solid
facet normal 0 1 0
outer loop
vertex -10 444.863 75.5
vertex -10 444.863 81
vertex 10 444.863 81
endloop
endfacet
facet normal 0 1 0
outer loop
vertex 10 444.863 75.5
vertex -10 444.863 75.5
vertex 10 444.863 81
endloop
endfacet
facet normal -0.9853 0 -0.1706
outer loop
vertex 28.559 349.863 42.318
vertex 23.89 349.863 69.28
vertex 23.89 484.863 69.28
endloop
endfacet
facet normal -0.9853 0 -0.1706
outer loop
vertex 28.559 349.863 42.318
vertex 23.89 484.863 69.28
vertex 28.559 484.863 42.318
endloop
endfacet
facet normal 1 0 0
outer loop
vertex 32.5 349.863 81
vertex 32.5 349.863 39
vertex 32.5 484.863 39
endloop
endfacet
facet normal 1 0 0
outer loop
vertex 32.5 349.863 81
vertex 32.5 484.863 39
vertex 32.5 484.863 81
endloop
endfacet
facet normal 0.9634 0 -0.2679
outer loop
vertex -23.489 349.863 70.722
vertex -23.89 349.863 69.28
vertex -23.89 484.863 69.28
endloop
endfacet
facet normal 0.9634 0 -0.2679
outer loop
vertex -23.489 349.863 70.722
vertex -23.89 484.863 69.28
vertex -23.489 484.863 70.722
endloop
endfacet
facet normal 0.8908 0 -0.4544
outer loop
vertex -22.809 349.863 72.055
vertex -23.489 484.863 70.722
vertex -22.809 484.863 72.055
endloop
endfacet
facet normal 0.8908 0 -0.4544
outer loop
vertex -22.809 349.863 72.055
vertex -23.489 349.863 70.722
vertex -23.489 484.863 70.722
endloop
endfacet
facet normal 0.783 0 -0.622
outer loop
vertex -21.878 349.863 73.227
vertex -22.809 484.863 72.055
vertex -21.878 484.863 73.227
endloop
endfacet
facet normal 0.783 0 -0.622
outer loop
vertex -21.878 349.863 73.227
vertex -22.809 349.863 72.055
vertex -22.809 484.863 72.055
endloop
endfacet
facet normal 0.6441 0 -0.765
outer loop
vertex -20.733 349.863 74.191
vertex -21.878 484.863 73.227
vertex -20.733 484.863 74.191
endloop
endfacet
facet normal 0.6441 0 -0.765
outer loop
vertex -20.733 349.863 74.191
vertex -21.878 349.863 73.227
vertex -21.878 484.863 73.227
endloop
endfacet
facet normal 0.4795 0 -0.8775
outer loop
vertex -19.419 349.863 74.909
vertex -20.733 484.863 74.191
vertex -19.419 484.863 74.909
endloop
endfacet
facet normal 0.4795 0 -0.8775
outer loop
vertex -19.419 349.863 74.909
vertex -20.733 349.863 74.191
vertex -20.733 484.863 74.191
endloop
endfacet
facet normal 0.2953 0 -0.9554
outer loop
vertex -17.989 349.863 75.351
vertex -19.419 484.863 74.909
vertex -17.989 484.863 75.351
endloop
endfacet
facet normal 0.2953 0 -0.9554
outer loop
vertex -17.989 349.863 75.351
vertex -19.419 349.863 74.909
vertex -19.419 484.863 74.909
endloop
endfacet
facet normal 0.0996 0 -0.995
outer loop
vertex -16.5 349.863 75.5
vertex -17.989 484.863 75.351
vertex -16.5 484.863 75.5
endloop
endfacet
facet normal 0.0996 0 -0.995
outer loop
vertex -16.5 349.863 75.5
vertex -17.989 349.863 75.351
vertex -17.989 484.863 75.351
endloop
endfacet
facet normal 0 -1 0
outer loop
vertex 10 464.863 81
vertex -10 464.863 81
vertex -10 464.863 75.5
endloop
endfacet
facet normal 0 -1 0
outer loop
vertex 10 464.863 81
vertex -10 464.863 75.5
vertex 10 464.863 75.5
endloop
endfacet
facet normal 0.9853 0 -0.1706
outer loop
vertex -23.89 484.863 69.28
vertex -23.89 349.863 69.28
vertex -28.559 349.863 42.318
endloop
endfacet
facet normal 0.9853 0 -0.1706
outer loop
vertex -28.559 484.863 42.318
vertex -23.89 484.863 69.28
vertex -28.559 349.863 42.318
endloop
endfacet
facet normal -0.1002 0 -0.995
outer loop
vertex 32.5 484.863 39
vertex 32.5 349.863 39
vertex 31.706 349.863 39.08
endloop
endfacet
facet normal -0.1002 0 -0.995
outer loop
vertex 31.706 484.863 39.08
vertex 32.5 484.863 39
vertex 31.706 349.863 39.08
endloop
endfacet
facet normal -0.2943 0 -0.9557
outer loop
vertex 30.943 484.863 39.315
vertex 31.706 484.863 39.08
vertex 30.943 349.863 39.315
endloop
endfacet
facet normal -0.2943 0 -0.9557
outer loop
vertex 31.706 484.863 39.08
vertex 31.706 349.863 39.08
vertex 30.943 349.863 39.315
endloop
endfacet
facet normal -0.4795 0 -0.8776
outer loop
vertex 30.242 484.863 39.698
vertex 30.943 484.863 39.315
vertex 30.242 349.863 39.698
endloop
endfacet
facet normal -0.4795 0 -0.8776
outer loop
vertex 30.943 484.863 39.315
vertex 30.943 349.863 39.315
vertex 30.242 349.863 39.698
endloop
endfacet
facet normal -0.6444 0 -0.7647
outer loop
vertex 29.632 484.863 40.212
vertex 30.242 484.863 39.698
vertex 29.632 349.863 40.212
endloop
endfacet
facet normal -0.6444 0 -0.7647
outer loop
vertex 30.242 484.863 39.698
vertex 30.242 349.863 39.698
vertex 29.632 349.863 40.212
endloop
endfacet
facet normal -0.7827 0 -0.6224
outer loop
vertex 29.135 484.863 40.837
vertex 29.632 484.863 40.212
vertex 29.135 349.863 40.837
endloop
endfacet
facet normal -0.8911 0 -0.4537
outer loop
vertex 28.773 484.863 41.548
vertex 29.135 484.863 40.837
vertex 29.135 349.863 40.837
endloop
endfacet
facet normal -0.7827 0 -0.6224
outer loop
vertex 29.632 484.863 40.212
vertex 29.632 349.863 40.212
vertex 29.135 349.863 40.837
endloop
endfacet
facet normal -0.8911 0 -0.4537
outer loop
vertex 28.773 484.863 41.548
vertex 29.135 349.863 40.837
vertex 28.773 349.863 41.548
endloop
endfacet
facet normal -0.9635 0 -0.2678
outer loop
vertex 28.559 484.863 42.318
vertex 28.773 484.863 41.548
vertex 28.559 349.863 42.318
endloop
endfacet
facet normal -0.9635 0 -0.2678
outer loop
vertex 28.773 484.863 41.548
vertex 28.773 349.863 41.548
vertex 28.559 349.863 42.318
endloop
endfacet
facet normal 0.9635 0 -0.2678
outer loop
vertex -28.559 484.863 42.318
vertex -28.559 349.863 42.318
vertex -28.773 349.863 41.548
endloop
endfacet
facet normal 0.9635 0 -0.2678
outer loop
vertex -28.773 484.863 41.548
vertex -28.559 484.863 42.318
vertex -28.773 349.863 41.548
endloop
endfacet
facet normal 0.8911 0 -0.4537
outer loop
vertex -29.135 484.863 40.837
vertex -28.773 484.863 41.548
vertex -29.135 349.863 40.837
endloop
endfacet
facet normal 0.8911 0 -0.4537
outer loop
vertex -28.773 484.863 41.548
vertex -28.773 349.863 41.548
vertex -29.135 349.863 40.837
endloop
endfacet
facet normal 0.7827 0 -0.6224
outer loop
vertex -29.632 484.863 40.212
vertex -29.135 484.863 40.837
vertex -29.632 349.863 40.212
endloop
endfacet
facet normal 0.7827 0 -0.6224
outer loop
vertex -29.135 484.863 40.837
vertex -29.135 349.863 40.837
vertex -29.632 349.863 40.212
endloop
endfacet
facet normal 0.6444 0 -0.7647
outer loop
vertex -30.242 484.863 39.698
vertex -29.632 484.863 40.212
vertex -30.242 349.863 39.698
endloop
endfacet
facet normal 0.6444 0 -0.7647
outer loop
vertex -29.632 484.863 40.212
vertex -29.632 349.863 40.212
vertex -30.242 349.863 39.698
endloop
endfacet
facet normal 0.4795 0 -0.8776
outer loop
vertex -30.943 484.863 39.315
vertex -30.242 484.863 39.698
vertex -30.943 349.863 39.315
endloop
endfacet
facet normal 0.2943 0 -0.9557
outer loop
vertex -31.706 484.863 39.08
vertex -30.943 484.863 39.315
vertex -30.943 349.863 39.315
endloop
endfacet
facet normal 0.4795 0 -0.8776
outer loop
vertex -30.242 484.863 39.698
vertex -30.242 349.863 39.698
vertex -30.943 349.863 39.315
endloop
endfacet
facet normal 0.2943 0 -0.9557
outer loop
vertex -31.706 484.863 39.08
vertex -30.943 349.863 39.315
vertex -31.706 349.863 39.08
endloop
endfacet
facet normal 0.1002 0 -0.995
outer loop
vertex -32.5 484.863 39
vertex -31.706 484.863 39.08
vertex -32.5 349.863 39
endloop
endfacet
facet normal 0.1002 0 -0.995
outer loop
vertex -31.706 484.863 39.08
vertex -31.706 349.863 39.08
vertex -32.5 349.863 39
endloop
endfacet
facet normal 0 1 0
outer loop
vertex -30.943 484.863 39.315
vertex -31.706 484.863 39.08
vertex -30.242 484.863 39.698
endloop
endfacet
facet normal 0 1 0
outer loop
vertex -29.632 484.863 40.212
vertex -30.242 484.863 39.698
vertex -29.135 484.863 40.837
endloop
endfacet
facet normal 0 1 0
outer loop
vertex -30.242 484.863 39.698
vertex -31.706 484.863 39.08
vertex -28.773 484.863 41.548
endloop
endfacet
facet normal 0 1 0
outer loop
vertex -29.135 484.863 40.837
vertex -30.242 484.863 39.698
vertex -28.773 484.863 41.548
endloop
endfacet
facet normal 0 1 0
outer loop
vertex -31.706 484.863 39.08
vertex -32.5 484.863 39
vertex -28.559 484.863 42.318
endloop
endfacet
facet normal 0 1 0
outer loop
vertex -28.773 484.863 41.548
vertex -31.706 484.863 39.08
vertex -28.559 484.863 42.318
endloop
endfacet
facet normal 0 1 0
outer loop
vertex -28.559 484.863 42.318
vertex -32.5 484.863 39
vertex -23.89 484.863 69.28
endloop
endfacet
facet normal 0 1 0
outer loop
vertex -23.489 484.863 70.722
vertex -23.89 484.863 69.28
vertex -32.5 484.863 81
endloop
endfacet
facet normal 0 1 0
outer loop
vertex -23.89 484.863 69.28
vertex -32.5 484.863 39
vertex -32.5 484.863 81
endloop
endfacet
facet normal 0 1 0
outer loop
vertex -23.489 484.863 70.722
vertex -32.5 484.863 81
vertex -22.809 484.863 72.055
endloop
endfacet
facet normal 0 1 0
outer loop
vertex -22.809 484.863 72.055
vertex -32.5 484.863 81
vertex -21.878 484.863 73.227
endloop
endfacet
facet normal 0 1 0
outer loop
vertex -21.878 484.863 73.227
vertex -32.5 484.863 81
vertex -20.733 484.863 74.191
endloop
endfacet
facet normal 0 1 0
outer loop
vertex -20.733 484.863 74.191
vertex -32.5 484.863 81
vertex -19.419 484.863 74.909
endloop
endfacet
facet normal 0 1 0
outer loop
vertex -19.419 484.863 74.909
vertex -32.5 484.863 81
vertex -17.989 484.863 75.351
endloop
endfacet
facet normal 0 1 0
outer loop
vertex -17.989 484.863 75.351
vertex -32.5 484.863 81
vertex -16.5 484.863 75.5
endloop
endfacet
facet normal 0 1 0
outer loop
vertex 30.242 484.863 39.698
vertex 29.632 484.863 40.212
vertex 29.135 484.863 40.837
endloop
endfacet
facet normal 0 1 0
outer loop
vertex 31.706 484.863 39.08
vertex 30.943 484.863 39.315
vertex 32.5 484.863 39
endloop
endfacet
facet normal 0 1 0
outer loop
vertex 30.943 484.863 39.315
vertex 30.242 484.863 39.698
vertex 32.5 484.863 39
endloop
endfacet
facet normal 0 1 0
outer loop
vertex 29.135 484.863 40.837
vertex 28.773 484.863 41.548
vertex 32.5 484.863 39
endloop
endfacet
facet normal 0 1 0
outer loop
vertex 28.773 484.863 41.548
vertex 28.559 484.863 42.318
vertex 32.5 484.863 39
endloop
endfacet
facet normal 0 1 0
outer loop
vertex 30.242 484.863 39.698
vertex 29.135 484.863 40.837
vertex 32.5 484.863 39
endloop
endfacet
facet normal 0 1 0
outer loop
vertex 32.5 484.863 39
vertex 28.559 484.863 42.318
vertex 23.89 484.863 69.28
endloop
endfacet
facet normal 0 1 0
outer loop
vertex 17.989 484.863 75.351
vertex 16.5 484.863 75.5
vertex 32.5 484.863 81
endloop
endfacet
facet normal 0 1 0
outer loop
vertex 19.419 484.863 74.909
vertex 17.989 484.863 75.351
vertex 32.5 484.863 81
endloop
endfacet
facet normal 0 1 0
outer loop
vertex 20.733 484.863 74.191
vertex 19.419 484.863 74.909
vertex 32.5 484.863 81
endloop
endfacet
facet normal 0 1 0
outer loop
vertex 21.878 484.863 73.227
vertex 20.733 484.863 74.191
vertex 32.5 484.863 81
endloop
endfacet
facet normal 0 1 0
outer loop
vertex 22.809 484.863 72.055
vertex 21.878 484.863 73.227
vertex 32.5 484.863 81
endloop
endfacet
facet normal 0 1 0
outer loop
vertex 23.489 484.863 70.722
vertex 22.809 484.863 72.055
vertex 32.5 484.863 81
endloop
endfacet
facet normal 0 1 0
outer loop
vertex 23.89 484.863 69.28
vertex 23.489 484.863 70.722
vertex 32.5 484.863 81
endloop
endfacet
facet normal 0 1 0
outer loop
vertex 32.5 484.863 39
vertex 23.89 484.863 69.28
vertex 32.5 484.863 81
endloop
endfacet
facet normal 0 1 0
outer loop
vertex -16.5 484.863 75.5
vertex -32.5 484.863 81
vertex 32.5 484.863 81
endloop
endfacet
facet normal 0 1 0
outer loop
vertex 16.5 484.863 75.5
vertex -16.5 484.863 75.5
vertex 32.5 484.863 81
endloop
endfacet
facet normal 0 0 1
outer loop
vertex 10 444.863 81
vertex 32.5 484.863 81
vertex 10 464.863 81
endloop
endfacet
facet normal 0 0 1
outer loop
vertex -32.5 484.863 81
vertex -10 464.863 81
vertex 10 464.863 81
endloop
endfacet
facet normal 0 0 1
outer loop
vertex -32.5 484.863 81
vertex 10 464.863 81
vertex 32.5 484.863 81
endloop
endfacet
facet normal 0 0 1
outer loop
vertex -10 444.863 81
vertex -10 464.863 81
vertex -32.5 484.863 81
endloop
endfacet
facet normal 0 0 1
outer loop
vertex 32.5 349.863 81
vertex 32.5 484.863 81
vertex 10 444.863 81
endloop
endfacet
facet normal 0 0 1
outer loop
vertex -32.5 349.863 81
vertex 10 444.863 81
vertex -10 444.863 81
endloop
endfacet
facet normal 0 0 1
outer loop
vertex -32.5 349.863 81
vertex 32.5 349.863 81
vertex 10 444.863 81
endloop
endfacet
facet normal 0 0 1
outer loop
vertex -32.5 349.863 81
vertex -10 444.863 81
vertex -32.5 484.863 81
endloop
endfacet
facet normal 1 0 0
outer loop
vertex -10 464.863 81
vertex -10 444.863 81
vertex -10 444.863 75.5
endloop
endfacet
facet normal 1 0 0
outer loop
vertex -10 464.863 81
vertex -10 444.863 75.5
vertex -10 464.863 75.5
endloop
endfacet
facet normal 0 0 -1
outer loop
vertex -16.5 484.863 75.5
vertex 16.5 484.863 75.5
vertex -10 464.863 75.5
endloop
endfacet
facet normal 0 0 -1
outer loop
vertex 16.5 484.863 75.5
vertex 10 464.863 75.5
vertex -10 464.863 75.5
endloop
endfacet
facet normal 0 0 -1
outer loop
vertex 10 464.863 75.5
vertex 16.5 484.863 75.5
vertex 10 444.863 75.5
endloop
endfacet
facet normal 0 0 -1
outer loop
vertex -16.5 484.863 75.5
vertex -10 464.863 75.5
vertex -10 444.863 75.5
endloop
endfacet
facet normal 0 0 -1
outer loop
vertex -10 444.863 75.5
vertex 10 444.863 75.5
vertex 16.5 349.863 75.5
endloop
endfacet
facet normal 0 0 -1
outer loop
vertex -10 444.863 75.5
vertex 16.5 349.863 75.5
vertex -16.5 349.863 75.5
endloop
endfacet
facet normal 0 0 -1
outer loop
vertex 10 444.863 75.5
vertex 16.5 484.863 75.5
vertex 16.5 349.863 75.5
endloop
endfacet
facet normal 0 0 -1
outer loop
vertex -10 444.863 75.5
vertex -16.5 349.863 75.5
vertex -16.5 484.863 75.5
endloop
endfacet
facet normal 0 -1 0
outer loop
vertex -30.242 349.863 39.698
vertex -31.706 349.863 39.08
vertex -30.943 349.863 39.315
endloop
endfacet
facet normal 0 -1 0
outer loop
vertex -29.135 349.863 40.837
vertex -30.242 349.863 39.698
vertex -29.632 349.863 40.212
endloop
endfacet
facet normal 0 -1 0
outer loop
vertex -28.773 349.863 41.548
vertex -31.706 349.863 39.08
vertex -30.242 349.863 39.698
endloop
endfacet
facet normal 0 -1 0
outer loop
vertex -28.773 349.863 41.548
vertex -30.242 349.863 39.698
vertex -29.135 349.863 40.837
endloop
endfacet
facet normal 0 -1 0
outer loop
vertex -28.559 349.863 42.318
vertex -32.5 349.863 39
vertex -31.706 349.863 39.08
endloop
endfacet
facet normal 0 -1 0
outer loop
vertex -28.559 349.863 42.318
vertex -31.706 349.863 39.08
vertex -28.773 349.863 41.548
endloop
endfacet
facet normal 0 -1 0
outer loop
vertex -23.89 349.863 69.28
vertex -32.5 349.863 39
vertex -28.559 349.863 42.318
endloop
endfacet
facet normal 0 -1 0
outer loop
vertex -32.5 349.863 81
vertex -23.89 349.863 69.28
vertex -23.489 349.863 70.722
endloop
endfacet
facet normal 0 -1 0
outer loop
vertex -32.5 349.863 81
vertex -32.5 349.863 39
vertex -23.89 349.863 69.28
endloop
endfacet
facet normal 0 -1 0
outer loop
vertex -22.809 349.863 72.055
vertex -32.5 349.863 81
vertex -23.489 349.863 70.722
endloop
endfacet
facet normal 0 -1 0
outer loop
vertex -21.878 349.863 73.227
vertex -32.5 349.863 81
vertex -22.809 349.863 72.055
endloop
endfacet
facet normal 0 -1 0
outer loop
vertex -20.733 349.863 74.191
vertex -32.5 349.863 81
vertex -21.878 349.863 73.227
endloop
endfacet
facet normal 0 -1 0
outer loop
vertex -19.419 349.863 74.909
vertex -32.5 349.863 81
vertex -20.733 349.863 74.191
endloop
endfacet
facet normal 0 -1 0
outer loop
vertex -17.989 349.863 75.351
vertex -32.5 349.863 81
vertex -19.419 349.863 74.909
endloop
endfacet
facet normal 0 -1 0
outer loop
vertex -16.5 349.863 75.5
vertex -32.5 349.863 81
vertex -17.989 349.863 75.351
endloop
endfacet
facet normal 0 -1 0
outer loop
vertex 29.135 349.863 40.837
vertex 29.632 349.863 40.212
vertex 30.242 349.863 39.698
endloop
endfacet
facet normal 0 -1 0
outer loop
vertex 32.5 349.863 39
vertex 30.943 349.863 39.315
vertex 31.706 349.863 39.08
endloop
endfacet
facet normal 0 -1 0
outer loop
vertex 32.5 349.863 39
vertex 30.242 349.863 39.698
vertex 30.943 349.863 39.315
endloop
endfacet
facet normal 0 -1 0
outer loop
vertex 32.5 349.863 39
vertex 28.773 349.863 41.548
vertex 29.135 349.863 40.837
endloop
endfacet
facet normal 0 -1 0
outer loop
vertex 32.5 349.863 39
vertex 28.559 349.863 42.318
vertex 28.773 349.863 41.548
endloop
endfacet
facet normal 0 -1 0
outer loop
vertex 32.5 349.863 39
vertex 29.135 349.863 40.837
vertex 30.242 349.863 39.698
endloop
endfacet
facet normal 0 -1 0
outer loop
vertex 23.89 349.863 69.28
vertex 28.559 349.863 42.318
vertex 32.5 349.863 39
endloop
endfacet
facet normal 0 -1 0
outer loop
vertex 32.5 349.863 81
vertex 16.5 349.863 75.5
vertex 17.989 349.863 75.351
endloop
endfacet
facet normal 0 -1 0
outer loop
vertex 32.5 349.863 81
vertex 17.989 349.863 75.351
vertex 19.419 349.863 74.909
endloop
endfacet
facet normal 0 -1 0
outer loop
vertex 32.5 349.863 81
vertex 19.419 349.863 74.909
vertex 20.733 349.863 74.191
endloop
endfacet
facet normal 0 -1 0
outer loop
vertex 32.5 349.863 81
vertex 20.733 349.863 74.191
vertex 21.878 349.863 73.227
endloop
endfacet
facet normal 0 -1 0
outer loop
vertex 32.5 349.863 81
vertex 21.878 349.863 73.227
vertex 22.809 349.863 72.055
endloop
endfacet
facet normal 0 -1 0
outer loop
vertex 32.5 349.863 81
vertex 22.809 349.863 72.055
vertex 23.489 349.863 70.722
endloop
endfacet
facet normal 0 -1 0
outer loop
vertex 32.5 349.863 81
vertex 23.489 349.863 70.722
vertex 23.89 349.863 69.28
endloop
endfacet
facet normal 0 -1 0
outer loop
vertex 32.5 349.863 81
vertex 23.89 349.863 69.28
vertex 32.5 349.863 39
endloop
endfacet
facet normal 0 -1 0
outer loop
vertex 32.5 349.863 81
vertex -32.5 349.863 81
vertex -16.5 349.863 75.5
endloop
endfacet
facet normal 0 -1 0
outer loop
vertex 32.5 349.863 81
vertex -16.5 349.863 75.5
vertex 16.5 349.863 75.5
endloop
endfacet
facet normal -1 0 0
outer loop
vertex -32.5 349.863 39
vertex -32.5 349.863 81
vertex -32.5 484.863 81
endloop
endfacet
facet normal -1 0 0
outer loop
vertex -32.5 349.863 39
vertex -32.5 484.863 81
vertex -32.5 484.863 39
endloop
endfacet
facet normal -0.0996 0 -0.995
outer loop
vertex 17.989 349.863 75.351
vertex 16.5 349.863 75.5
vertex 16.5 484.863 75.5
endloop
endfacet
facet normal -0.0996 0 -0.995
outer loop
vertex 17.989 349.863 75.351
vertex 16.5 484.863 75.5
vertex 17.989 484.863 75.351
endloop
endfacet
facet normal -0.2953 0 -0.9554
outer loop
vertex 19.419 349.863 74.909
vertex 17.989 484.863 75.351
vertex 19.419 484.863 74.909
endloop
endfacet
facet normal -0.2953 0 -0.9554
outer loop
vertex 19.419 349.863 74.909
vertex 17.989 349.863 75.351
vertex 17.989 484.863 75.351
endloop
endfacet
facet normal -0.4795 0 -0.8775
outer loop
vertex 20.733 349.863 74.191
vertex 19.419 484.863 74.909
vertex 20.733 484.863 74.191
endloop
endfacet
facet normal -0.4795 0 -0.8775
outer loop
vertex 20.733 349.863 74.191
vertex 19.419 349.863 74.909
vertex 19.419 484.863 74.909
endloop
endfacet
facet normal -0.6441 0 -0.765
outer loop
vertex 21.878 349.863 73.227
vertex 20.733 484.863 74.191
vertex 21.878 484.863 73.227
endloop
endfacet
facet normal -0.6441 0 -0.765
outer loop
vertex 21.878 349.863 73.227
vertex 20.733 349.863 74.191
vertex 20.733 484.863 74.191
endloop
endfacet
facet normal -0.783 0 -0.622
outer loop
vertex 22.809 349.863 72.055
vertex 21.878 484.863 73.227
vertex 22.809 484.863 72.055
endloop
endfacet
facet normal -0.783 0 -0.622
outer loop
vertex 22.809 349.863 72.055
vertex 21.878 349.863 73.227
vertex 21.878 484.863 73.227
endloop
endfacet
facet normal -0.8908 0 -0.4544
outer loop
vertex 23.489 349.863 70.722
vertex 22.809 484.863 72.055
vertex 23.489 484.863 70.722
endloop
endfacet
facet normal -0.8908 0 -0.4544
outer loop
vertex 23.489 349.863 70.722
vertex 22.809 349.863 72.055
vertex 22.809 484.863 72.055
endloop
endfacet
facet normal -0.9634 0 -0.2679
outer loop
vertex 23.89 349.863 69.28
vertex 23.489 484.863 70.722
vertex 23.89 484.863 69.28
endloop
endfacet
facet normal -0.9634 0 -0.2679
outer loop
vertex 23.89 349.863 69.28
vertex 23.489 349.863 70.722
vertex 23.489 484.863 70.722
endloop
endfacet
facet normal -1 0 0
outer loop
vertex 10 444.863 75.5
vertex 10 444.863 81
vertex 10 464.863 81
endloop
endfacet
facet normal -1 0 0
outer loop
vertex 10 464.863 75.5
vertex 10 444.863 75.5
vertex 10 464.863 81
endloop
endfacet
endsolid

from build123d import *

# Parameters (mm, degrees)
SKETCH017_W      = 20
SKETCH017_H      = 20
EXTRUDE016_DEPTH = 15
EXTRUDE017_DEPTH = 135


with BuildPart() as extrude016:
    # Sketch017 (on Face2 of Extrude017) → Extrude016 (new body, symmetric)
    with BuildSketch(Plane.XY.offset(81)):
        with Locations((0, 454.863156)):
            Rectangle(SKETCH017_W, SKETCH017_H)
    extrude(amount=EXTRUDE016_DEPTH, both=True)


with BuildPart() as u069:
    # Sketch019 (on Face6 of Extrude015) → Extrude017 (new body)
    with BuildSketch(Plane(origin=(0, 349.863156, 0), x_dir=(-1, 0, 0), z_dir=(0, 1, 0))):
        with BuildLine():
            Line((-32.5, 39), (-32.5, 81))
            Line((-32.5, 81), (32.5, 81))
            Line((32.5, 81), (32.5, 39))
            ThreePointArc((28.55865, 42.317536), (29.924137, 39.939783), (32.5, 39))
            Line((23.890032, 69.27962), (28.55865, 42.317536))
            ThreePointArc((23.890032, 69.27962), (21.329744, 73.737907), (16.5, 75.5))
            Line((-16.5, 75.5), (16.5, 75.5))
            ThreePointArc((-16.5, 75.5), (-21.329744, 73.737907), (-23.890032, 69.27962))
            Line((-23.890032, 69.27962), (-28.55865, 42.317536))
            ThreePointArc((-32.5, 39), (-29.924137, 39.939783), (-28.55865, 42.317536))
        make_face()
    extrude(amount=EXTRUDE017_DEPTH)

    # Cut006: cut Extrude016
    add(extrude016.part, mode=Mode.SUBTRACT)


solid = u069.part
